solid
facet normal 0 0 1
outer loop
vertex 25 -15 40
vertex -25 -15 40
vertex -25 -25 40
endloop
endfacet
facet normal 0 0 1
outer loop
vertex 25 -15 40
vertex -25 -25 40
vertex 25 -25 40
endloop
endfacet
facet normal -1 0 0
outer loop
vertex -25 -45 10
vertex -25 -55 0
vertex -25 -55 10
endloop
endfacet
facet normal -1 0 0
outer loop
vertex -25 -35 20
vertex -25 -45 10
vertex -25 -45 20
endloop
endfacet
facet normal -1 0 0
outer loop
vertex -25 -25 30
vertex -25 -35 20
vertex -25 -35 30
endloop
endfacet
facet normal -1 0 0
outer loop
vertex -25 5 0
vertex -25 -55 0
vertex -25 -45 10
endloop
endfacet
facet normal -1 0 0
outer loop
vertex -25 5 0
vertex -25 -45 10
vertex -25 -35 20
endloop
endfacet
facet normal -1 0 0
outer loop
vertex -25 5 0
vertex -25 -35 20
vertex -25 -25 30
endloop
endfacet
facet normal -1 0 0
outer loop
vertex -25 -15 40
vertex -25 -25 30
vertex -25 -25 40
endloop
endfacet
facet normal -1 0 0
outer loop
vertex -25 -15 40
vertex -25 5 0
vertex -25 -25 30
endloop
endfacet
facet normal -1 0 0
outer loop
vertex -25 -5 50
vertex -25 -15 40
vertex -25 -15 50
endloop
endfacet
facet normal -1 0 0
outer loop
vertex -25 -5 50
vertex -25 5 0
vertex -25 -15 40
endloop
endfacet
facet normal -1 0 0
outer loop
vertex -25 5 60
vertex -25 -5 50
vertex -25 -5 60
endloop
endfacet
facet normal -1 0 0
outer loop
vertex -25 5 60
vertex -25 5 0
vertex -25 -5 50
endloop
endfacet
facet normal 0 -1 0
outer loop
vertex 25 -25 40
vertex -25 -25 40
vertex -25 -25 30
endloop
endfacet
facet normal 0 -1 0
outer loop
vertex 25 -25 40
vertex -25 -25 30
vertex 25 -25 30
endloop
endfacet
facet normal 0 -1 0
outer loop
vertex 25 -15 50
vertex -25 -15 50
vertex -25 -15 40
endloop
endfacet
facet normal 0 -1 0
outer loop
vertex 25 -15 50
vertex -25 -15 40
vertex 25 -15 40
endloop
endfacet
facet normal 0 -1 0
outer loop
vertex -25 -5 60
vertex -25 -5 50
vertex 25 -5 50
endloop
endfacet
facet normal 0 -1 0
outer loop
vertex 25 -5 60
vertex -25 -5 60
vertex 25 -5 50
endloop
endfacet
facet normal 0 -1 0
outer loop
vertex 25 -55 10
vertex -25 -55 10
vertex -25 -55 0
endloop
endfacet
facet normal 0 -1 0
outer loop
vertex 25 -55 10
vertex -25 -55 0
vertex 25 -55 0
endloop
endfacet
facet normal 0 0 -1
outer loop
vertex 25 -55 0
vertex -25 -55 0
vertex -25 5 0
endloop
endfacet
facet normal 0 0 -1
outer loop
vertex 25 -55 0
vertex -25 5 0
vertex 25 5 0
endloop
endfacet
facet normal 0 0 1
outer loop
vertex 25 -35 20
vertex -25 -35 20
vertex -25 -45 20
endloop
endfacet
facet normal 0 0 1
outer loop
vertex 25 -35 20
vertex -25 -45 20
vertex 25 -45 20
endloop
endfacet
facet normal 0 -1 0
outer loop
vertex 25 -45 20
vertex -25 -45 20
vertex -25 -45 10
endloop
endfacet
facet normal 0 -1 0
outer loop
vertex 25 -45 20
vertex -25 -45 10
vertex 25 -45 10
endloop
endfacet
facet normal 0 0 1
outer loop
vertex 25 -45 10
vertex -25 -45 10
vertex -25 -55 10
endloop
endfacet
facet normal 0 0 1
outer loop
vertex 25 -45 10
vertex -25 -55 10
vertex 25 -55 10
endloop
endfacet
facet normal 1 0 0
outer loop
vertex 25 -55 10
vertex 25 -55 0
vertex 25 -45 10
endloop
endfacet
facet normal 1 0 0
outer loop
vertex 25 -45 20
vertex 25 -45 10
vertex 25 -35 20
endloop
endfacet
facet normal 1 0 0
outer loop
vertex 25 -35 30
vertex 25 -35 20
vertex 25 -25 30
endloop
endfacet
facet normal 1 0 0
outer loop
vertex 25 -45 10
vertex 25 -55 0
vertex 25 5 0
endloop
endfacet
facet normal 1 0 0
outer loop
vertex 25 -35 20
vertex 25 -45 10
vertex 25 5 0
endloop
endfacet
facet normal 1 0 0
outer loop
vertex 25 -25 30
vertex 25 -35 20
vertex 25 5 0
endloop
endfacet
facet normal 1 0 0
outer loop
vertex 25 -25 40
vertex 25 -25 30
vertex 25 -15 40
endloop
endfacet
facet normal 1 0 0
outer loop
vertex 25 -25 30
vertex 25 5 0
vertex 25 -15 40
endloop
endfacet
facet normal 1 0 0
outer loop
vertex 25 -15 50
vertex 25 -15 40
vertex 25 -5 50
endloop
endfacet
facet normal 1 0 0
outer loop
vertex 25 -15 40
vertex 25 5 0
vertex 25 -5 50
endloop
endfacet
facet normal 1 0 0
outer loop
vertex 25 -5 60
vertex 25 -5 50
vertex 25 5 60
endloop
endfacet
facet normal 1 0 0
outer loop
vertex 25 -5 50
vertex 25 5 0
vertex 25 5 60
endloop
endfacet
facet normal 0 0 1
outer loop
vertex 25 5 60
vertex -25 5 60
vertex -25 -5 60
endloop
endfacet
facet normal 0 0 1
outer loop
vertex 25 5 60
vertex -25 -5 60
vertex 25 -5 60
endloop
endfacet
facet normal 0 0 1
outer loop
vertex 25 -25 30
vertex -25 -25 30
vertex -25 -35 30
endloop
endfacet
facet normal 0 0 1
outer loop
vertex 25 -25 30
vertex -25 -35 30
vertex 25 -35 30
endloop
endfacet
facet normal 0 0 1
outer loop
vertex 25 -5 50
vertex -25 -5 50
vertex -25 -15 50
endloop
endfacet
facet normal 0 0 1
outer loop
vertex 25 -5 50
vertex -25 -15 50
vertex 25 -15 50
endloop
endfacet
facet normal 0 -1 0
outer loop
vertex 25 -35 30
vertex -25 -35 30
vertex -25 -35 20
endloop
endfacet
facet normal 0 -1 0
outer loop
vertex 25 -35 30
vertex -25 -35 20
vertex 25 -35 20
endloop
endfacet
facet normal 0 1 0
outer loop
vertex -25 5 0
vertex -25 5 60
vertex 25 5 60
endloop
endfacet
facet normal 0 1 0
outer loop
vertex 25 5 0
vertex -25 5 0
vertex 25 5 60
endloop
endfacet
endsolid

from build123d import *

# Parameters (mm, degrees)
F0_W      = 50
F0_H      = 10
F1_DEPTH  = 60
F2_W      = 50
F2_H      = 10
F3_DEPTH  = 10
F4_W      = 50
F4_H      = 10
F5_DEPTH  = 20
F6_W      = 50
F6_H      = 10
F7_DEPTH  = 30
F8_W      = 50
F8_H      = 10
F9_DEPTH  = 40
F10_W     = 50
F10_H     = 10
F11_DEPTH = 50


with BuildPart() as f1:
    # F0 (on Top) → F1 (new body)
    with BuildSketch(Plane.XY):
        Rectangle(F0_W, F0_H)
    extrude(amount=F1_DEPTH)

    # F2 (on face) → F3 (join)
    with BuildSketch(Plane.XZ.offset(5)):
        with Locations((0, 45)):
            Rectangle(F2_W, F2_H)
    extrude(amount=F3_DEPTH)

    # F4 (on face) → F5 (join)
    with BuildSketch(Plane.XZ.offset(5)):
        with Locations((0, 35)):
            Rectangle(F4_W, F4_H)
    extrude(amount=F5_DEPTH)

    # F6 (on face) → F7 (join)
    with BuildSketch(Plane.XZ.offset(5)):
        with Locations((0, 25)):
            Rectangle(F6_W, F6_H)
    extrude(amount=F7_DEPTH)

    # F8 (on face) → F9 (join)
    with BuildSketch(Plane.XZ.offset(5)):
        with Locations((0, 15)):
            Rectangle(F8_W, F8_H)
    extrude(amount=F9_DEPTH)

    # F10 (on face) → F11 (join)
    with BuildSketch(Plane.XZ.offset(5)):
        with Locations((0, 5)):
            Rectangle(F10_W, F10_H)
    extrude(amount=F11_DEPTH)


solid = f1.part
